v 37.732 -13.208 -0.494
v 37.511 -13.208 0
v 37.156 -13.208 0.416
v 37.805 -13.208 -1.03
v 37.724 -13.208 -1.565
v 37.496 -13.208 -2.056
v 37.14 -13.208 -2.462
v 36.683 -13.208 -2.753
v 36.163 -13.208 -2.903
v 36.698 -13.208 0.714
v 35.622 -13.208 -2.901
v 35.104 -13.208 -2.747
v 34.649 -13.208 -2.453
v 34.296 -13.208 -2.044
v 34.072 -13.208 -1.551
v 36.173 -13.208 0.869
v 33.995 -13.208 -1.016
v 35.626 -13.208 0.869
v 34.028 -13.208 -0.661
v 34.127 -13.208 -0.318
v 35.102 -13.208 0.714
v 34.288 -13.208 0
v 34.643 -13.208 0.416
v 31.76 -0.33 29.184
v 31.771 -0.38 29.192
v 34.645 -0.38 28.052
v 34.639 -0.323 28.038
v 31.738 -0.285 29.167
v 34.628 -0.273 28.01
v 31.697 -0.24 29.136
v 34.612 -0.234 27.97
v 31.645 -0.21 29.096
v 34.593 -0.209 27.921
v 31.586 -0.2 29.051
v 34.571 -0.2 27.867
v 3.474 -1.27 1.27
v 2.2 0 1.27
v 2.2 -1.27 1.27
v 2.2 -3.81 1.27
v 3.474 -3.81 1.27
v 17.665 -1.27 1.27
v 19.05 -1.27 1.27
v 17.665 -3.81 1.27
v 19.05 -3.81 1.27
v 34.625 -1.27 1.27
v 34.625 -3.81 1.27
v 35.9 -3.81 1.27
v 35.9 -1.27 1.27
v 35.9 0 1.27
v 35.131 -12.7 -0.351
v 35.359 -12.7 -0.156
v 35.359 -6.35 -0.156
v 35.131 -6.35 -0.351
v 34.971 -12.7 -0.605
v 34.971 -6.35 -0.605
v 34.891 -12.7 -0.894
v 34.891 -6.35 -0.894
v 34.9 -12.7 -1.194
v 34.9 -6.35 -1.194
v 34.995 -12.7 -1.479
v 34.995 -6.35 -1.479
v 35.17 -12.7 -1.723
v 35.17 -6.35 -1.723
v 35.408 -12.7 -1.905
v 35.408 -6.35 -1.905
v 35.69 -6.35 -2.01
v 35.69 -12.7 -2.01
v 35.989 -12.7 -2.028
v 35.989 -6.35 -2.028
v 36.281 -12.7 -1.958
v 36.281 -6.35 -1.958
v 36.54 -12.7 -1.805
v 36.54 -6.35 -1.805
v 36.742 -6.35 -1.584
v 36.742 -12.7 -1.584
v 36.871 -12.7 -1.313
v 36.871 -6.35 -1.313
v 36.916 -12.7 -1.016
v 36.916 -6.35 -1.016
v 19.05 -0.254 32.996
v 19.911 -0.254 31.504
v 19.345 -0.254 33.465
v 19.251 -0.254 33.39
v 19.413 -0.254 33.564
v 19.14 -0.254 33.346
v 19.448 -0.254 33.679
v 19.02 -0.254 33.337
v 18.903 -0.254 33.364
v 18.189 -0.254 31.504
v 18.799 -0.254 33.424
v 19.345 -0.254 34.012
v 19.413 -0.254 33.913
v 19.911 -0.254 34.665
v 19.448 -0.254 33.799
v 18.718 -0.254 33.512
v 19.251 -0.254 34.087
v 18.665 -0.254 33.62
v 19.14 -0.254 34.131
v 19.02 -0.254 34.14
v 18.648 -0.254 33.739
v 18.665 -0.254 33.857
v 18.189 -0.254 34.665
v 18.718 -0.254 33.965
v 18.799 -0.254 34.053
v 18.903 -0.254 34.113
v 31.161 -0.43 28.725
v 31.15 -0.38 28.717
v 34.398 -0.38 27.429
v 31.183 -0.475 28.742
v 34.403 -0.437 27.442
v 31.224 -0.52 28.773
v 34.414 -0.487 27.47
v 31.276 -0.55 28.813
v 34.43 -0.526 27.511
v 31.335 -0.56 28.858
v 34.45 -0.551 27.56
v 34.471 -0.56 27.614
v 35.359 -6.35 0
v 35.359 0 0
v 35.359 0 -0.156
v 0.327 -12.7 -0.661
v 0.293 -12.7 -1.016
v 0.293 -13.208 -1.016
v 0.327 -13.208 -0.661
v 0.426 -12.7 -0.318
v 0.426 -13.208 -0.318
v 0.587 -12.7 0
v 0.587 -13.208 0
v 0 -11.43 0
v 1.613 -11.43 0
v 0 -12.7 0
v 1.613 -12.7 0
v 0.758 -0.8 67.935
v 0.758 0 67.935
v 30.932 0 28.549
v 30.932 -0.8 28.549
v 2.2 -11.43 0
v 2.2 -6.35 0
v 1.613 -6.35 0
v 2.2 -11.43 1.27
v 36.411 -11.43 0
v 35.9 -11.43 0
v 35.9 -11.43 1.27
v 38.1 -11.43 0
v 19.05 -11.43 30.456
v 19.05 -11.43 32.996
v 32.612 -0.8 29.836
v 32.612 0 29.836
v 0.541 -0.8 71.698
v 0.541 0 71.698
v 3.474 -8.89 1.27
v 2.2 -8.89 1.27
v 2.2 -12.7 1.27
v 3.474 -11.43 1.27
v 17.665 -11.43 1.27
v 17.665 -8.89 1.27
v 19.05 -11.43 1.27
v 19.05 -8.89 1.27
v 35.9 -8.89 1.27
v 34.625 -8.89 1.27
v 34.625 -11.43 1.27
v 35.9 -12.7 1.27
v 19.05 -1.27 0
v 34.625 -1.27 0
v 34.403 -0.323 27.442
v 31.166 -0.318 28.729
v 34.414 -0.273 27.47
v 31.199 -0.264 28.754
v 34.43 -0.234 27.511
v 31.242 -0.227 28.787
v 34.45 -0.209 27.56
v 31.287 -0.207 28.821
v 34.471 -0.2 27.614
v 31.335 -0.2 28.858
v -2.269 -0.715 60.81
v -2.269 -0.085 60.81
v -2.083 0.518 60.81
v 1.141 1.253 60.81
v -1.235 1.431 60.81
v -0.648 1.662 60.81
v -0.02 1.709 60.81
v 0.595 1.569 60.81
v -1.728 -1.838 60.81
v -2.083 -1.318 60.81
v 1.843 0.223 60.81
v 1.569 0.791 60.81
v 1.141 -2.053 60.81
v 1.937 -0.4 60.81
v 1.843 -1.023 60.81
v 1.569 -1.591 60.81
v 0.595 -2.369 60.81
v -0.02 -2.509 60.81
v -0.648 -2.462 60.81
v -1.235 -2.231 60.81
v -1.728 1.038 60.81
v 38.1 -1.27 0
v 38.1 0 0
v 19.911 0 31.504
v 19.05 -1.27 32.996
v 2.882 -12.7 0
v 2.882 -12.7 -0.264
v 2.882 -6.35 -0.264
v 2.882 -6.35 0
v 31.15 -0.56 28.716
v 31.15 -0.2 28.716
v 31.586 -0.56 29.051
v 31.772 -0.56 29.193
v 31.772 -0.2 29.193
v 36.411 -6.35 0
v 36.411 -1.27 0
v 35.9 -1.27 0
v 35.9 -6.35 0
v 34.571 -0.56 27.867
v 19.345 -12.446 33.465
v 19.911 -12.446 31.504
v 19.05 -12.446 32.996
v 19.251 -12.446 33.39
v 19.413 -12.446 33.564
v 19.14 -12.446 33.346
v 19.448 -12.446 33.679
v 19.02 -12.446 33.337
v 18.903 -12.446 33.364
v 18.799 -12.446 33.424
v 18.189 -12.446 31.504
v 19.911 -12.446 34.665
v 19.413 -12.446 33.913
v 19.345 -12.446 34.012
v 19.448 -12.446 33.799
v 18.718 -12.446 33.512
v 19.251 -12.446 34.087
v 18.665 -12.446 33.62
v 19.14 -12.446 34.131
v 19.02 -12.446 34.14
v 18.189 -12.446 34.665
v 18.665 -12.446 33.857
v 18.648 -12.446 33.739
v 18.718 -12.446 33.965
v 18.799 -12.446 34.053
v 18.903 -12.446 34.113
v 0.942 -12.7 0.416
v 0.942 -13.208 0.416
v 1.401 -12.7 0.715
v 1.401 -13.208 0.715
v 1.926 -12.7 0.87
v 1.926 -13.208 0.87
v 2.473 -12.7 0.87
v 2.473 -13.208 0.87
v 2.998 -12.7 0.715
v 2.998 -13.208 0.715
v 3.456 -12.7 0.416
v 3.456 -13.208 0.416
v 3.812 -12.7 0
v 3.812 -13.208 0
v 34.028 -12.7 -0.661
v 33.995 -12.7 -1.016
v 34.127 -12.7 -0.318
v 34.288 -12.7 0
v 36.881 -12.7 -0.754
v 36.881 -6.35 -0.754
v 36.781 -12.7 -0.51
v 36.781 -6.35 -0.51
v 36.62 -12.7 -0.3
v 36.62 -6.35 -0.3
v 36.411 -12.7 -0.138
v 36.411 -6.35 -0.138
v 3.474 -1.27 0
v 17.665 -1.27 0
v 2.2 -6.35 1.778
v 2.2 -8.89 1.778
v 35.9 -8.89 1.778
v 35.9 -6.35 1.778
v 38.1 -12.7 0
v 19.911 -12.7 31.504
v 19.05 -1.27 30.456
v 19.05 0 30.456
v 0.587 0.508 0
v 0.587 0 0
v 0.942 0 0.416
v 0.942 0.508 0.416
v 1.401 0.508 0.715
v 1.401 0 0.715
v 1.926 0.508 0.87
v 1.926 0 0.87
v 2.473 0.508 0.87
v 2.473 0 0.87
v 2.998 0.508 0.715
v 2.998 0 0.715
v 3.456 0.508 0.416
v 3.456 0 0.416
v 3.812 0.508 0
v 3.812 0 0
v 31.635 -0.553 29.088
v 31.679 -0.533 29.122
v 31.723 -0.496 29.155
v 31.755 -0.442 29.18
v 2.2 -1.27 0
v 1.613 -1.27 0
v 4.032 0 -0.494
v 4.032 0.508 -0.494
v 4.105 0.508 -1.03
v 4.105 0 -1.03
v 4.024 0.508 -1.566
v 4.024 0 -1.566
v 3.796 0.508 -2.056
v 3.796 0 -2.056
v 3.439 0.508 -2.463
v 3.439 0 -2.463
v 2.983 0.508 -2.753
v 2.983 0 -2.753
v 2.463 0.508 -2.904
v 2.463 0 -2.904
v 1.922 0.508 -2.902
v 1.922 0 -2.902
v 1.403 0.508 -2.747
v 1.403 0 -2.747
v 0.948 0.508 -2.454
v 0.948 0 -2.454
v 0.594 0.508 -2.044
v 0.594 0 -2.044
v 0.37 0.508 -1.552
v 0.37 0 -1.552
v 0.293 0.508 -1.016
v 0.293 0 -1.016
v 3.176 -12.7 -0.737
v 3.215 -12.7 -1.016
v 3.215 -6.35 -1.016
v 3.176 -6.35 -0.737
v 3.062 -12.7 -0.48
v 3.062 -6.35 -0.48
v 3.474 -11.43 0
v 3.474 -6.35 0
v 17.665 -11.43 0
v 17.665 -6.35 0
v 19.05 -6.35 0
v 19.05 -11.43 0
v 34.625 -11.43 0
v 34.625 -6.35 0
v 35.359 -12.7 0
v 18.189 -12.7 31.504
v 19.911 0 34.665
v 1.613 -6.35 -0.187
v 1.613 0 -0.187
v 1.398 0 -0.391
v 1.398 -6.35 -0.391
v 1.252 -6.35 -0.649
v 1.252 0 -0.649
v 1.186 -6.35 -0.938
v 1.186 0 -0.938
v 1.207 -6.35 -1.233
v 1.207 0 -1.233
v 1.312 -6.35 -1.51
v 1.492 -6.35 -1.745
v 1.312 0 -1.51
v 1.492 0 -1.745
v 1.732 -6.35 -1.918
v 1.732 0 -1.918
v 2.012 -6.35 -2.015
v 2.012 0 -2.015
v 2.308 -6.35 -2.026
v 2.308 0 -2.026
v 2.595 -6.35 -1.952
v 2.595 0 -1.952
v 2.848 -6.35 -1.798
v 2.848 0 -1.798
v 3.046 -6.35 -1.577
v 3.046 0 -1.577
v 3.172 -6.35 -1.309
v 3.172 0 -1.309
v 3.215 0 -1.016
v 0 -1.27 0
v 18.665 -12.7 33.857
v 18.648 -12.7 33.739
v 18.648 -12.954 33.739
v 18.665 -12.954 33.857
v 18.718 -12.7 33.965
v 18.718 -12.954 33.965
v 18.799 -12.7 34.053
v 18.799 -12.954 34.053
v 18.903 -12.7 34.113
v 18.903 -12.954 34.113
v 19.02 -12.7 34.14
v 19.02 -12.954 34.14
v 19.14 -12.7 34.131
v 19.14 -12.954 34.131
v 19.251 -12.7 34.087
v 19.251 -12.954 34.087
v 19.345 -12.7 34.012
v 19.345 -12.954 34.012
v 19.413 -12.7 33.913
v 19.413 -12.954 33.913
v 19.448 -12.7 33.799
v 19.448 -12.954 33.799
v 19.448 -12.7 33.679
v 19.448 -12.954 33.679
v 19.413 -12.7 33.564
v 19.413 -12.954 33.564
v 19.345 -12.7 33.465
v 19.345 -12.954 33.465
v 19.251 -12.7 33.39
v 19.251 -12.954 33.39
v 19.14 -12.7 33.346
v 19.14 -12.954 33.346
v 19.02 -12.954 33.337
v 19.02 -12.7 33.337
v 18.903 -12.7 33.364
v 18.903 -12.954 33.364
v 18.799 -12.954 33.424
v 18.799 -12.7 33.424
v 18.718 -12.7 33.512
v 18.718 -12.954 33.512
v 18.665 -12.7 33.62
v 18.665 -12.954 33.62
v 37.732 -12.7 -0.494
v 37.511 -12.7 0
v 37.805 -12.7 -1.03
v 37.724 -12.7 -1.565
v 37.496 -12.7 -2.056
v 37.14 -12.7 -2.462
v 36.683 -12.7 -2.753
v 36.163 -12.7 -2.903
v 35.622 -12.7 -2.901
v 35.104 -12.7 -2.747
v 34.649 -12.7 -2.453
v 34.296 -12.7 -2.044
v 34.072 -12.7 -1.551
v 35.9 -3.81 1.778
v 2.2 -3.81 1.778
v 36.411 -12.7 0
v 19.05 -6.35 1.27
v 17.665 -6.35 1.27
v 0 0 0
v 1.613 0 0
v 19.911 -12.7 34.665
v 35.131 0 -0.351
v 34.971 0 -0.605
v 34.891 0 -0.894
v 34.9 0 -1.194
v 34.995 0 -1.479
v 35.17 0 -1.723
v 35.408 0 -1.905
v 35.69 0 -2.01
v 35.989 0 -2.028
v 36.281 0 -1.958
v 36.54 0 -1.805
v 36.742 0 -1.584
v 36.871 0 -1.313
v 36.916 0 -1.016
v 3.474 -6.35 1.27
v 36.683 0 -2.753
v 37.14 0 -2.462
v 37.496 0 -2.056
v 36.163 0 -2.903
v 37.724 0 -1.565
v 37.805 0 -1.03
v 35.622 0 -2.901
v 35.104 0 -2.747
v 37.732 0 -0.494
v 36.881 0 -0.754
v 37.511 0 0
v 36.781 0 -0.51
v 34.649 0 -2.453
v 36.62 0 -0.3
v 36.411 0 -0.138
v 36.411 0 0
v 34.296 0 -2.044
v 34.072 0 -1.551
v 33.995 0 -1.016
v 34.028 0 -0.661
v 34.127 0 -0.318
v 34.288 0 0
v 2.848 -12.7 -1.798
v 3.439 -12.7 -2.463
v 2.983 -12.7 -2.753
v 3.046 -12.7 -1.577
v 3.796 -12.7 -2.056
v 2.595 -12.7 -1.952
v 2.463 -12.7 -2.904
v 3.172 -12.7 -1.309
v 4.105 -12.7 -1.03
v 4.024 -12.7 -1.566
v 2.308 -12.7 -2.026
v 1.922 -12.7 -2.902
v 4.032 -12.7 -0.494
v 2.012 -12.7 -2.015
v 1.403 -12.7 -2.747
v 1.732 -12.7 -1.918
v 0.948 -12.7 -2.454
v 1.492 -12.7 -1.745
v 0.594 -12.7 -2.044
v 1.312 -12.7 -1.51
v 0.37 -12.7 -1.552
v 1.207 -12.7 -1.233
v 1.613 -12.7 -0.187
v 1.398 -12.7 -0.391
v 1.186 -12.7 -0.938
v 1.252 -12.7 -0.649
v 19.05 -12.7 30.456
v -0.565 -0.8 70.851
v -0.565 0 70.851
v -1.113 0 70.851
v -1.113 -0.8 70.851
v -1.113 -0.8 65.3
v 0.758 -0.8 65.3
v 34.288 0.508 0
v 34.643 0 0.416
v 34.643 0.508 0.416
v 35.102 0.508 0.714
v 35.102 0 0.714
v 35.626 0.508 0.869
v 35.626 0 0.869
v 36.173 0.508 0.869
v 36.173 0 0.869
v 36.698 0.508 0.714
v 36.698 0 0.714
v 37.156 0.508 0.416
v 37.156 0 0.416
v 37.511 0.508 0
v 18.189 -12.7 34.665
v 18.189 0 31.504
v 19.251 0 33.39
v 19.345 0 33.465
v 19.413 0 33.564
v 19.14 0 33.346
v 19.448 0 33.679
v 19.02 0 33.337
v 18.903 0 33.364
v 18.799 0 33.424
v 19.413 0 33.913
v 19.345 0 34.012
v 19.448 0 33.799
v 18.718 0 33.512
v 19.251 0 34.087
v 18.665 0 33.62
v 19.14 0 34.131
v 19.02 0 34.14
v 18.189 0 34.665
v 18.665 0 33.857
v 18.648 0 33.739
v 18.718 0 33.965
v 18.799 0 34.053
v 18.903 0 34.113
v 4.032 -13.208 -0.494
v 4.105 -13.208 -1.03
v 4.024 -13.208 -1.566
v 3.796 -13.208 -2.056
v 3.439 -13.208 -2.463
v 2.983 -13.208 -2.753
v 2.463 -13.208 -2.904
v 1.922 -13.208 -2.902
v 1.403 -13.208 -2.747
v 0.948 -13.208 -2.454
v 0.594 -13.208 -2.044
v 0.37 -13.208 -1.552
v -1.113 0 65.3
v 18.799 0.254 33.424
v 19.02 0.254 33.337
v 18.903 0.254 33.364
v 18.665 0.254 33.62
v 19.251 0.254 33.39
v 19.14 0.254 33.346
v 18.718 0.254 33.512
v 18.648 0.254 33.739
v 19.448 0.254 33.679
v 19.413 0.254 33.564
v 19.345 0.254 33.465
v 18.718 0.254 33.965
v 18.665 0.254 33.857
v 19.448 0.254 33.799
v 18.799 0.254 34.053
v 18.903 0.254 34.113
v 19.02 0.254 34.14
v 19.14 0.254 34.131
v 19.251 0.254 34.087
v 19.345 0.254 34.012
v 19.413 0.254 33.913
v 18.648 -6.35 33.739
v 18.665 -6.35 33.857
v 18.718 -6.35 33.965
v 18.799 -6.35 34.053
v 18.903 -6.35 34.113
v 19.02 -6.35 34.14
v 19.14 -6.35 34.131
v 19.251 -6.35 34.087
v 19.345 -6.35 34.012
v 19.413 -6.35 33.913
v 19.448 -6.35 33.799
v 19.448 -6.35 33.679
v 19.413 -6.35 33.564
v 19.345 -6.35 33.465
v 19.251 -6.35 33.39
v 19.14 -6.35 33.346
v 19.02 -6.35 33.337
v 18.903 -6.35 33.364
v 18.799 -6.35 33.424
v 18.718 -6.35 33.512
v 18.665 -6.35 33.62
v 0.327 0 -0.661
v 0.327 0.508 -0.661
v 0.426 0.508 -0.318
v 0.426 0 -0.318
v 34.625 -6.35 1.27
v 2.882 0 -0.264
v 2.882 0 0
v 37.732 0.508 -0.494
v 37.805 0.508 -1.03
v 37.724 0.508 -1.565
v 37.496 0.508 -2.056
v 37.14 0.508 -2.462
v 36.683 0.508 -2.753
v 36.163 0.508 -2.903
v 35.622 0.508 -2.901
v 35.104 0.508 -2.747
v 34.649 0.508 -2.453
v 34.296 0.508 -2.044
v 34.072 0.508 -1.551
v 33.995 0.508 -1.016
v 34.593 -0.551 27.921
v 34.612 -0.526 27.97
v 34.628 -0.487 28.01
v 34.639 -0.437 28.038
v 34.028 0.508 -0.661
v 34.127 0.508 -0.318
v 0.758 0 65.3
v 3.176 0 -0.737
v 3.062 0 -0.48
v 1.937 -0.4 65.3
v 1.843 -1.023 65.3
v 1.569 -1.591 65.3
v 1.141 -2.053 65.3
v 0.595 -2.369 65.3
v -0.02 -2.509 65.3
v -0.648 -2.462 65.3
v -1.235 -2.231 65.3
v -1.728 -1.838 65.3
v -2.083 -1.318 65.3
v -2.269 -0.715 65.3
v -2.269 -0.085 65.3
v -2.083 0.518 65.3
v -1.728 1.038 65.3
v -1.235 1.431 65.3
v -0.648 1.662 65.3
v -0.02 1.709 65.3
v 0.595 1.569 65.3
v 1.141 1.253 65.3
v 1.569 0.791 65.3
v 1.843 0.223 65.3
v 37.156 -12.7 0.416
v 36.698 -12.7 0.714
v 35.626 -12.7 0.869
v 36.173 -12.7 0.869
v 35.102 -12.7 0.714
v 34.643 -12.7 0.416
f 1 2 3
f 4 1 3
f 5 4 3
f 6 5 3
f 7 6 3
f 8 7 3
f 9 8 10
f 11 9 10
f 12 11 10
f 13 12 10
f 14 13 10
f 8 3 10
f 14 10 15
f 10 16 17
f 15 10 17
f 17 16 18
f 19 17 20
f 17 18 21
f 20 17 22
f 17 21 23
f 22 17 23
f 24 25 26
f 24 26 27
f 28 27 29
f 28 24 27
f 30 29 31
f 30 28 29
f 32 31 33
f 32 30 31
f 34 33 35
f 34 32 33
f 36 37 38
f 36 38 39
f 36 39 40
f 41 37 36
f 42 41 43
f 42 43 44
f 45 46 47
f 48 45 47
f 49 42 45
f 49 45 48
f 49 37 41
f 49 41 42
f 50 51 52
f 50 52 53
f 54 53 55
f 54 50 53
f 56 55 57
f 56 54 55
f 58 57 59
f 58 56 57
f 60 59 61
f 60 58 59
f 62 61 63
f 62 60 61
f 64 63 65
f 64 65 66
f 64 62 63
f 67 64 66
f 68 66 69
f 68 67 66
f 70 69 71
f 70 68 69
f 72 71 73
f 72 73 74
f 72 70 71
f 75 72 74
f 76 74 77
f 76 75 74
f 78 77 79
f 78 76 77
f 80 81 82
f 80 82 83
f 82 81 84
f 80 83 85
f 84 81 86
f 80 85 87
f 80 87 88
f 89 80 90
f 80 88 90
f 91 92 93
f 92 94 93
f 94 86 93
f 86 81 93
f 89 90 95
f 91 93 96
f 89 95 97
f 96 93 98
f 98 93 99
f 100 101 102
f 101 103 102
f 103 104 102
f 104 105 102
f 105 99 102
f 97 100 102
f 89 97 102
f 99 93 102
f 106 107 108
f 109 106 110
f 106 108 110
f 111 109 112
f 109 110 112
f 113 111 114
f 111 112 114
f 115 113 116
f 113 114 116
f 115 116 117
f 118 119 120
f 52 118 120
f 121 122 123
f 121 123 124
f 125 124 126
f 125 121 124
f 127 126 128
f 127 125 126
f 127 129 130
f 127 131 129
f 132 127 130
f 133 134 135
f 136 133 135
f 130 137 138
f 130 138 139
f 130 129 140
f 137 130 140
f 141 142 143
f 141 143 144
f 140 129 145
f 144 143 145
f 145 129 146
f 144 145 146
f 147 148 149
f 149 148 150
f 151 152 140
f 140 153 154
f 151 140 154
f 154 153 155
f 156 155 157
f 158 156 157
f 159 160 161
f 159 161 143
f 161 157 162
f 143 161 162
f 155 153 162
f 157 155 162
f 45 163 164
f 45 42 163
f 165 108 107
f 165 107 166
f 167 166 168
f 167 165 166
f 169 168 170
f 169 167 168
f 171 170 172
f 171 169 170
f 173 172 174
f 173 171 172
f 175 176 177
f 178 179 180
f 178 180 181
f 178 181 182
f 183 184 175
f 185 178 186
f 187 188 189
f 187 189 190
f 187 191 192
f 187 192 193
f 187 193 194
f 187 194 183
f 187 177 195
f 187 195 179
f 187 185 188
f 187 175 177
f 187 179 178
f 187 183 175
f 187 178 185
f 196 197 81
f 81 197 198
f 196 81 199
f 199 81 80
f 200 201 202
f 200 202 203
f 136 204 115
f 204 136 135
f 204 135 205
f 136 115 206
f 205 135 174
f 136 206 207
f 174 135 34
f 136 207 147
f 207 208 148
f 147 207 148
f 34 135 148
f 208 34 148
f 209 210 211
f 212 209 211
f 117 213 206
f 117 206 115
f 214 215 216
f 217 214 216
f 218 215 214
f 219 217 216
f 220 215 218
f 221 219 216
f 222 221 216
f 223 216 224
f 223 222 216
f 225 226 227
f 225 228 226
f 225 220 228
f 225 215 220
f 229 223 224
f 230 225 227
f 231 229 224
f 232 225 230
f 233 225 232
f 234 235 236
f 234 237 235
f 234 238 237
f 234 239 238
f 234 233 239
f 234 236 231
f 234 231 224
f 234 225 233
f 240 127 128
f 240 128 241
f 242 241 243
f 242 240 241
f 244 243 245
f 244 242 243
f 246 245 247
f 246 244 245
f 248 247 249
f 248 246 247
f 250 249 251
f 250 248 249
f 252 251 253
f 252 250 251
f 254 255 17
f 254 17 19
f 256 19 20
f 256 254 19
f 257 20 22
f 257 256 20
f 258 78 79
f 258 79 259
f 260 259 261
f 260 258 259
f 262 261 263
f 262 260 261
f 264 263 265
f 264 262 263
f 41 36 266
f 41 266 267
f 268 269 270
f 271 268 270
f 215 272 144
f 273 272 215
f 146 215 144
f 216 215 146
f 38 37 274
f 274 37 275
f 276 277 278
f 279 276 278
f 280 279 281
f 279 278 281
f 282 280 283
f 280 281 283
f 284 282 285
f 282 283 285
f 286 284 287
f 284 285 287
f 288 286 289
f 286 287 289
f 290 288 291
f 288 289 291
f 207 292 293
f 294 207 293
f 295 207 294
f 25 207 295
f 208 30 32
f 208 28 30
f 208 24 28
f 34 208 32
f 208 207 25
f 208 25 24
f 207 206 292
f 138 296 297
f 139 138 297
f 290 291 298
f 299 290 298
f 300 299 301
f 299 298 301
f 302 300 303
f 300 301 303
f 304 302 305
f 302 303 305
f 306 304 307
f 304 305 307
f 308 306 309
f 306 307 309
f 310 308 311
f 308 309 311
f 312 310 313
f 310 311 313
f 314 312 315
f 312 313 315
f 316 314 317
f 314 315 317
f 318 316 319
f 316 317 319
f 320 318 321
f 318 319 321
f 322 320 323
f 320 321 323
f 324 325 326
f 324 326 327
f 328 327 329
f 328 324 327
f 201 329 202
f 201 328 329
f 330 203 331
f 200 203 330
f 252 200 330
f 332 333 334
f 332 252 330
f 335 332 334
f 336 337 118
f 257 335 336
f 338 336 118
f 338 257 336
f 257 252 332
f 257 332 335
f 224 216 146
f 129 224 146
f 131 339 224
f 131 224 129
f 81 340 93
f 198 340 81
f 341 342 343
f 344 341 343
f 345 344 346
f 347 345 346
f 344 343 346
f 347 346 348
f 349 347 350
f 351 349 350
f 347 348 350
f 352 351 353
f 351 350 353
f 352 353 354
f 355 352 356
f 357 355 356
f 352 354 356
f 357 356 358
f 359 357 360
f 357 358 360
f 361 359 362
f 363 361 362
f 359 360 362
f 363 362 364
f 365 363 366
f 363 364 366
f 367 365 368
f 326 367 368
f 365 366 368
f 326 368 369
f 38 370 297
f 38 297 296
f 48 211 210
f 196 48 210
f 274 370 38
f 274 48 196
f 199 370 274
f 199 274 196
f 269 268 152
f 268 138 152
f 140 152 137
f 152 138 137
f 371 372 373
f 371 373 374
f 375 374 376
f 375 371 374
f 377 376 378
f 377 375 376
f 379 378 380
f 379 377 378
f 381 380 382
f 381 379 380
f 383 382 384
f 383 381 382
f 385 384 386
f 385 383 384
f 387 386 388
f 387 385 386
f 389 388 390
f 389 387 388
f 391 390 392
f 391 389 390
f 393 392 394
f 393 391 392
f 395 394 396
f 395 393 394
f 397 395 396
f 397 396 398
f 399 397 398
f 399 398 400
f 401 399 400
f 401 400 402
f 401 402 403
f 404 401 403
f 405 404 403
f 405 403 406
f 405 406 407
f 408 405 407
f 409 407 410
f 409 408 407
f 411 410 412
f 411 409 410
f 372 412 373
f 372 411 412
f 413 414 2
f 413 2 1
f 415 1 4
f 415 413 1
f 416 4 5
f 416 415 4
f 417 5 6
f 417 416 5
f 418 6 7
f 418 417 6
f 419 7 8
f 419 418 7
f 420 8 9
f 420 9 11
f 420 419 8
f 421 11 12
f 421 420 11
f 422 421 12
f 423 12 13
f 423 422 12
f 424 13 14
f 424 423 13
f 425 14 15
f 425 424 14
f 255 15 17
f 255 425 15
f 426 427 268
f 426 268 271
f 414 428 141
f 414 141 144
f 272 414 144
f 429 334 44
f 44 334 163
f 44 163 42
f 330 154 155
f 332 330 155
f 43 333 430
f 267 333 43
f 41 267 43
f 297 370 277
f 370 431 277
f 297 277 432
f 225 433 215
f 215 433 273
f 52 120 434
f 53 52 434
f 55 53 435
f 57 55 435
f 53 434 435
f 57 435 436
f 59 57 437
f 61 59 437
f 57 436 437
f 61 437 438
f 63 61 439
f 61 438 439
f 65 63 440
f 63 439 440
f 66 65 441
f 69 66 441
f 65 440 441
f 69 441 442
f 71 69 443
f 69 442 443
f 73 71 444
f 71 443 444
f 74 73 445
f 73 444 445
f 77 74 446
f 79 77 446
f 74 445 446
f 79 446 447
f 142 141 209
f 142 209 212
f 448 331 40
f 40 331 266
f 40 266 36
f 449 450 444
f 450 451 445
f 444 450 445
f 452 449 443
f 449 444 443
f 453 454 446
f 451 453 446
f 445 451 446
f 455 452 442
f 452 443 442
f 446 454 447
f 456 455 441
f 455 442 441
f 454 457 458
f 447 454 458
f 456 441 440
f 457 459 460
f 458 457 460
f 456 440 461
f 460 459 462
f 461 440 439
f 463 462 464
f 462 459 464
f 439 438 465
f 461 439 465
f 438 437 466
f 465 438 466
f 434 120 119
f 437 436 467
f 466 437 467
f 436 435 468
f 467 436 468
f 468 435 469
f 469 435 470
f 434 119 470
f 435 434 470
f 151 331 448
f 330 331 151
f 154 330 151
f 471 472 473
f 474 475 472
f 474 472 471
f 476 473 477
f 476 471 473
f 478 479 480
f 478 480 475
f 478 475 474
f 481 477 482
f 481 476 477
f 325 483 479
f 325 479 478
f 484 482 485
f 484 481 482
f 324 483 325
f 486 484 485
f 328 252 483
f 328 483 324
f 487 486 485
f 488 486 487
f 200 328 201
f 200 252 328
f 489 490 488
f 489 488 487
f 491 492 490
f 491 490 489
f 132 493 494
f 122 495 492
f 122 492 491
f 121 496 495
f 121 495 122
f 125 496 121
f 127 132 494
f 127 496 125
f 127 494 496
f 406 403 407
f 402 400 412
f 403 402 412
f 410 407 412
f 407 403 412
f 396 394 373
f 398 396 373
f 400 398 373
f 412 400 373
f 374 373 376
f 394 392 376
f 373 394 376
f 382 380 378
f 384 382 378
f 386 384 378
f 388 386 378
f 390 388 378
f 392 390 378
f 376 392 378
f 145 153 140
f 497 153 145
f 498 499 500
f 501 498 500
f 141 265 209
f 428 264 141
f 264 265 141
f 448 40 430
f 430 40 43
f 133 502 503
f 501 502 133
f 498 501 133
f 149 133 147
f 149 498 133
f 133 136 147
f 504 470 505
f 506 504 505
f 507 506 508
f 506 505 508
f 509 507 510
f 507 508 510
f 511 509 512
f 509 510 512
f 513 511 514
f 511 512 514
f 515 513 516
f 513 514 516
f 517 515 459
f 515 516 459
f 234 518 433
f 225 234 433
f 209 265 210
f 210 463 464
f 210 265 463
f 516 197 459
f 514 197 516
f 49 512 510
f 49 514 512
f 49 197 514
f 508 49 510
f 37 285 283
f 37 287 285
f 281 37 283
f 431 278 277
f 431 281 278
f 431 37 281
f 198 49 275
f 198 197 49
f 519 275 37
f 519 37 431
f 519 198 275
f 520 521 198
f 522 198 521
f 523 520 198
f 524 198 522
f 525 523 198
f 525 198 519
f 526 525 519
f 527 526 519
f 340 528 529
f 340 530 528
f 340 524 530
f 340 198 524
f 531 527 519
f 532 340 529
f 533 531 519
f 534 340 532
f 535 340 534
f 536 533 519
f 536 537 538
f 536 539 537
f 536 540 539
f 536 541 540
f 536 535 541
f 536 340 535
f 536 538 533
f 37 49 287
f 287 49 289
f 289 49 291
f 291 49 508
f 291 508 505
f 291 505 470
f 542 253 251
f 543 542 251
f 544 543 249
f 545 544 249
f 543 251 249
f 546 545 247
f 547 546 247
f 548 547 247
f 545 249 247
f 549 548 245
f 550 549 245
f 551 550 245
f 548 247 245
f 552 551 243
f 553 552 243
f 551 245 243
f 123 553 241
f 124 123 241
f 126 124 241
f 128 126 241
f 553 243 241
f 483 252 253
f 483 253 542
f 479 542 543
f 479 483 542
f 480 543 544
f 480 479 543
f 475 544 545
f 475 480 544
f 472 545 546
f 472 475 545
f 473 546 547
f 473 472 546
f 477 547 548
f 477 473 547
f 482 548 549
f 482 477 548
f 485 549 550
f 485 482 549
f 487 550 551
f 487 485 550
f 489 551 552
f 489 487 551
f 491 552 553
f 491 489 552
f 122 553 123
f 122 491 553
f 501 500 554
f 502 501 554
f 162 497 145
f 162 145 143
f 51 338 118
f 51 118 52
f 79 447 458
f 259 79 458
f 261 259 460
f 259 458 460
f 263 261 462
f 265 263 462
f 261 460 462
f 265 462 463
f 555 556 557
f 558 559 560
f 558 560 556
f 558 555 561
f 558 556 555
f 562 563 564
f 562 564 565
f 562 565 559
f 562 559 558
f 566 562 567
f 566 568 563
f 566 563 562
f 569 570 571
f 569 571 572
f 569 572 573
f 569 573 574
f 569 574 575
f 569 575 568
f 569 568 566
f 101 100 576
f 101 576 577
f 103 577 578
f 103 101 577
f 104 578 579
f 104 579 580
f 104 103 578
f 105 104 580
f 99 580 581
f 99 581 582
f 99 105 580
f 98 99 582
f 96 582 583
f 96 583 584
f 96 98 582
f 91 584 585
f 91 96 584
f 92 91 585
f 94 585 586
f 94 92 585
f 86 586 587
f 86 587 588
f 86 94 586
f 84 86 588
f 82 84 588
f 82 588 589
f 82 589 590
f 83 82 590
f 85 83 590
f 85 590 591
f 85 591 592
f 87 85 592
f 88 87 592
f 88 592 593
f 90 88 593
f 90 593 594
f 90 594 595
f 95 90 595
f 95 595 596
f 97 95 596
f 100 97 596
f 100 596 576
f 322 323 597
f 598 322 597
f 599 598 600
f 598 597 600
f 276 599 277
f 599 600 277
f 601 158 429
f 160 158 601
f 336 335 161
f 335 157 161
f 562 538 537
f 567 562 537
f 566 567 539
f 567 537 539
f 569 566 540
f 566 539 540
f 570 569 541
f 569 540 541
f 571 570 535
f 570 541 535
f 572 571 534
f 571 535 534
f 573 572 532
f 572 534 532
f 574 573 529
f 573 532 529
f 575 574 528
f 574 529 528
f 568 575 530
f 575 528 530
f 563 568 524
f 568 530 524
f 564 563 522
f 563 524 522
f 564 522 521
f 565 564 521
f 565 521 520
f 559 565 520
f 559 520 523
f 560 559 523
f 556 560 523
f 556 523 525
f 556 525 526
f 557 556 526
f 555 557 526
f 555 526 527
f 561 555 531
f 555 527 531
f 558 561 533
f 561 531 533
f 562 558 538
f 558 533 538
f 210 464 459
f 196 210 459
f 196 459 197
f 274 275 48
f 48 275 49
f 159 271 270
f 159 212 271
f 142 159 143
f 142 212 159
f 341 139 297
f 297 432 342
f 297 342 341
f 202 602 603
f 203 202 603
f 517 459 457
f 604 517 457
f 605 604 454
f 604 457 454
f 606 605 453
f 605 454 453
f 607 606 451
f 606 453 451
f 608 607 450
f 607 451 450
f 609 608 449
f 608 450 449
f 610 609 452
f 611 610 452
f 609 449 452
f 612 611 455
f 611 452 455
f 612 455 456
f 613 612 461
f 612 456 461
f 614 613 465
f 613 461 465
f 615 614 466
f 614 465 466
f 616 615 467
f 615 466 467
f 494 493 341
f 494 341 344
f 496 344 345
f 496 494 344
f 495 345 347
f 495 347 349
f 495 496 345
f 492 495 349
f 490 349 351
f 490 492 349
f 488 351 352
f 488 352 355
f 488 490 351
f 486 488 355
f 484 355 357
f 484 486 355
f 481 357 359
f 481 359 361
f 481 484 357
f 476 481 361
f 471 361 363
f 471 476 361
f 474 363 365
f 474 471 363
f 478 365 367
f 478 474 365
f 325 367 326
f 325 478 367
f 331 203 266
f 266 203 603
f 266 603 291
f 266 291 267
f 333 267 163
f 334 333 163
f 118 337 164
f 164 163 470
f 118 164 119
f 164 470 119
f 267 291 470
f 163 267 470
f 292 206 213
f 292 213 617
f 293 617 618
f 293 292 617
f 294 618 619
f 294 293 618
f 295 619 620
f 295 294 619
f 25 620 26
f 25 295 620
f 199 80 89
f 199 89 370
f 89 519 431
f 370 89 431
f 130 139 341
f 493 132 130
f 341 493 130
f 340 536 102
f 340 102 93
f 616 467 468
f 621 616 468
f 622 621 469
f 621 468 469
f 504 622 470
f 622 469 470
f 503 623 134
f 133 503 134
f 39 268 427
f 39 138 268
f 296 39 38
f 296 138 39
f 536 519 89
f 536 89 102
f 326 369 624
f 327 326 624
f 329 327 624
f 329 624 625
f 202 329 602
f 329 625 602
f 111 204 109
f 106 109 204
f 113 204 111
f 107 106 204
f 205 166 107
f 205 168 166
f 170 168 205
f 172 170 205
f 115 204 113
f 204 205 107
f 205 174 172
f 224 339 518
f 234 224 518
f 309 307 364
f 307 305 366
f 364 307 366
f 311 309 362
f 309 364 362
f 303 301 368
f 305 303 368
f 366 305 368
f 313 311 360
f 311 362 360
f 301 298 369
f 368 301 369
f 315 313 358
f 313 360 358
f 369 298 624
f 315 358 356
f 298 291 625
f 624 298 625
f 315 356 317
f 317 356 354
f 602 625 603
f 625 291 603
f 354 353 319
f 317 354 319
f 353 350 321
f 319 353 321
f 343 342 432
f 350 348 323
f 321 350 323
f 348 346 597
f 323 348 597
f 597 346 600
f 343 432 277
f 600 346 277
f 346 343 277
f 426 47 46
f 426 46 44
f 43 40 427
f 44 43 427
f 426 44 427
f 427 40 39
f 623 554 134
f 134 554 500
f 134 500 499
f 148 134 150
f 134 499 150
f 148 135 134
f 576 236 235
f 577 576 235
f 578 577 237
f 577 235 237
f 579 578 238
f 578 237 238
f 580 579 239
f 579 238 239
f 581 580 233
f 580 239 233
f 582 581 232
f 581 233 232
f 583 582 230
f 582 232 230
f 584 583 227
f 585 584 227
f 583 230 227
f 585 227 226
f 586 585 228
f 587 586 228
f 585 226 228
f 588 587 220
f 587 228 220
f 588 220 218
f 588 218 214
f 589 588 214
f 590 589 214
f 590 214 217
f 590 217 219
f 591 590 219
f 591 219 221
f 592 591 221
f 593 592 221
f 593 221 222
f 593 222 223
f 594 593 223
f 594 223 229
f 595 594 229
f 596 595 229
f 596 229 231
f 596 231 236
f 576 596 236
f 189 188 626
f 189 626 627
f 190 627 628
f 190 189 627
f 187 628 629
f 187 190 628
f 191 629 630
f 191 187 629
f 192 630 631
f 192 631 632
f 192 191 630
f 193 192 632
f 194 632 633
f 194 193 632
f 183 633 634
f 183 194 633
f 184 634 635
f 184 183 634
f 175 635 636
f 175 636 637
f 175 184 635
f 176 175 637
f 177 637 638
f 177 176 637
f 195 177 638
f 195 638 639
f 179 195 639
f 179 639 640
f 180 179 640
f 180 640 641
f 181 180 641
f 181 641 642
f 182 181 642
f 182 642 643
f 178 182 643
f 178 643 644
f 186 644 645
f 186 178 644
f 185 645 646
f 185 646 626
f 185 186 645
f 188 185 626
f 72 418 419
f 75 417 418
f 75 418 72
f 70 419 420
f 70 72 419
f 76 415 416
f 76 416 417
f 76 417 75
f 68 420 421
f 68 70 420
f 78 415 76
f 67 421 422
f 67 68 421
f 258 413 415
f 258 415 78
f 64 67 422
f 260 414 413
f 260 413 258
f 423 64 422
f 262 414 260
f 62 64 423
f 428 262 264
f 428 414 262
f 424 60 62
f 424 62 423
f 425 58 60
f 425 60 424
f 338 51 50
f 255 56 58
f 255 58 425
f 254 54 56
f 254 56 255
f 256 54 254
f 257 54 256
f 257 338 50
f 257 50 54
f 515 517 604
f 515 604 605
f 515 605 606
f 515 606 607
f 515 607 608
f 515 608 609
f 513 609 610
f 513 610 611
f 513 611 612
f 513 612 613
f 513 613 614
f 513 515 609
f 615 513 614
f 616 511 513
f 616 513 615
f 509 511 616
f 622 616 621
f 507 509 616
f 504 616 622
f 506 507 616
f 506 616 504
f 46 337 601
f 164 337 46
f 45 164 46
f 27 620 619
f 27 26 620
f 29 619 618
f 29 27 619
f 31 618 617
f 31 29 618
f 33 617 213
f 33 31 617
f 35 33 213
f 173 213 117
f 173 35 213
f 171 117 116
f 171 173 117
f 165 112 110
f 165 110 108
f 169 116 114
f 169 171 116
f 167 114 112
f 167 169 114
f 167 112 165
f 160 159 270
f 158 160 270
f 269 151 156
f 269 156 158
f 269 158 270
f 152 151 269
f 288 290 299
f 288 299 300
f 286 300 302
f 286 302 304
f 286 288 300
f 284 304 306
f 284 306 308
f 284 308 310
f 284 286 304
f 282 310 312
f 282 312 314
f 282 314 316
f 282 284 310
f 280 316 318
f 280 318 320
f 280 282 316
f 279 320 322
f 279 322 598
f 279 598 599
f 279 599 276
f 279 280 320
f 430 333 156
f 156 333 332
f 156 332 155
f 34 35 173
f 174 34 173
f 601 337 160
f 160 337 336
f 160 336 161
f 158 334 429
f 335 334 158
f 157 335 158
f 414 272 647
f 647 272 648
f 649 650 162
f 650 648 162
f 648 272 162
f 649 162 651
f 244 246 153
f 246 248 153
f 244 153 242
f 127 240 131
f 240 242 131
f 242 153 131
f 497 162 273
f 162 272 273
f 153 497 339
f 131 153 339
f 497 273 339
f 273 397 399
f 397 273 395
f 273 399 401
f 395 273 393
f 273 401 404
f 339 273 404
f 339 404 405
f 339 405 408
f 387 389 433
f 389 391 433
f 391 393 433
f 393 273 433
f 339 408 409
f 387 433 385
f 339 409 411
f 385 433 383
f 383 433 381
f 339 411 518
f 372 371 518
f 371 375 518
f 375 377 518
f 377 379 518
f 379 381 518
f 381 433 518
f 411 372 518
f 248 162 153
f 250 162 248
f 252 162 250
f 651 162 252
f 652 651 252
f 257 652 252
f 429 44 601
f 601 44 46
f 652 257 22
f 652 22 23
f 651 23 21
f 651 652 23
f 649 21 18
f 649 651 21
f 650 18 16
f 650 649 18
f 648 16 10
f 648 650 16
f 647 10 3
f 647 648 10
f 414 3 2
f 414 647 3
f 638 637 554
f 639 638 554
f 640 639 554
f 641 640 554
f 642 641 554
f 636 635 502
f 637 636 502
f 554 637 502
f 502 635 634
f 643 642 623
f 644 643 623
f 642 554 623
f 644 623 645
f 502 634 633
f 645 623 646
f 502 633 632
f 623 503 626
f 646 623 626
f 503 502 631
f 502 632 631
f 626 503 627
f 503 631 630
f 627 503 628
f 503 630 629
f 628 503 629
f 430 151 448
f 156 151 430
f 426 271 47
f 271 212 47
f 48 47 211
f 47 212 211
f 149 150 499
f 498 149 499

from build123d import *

# Parameters (mm, degrees)
F1_DEPTH       = 1.27
F2_W           = 1.2741235553
F2_H           = 1.2699995968
F2_W_2         = 1.3848708451
F2_W_3         = 1.2754402073
F3_DEPTH       = 5.08
F4_DEPTH       = 6.35
F6_DEPTH       = 0.508
F7_W           = 14.1913017724
F7_H           = 2.54
F7_W_2         = 1.2741235553
F7_W_3         = 1.3848708451
F7_W_4         = 15.5748559654
F7_W_5         = 1.2754402073
F8_DEPTH       = 0.508
F9_R           = 0.4024133142
F10_DEPTH      = 0.254
F11_DEPTH      = 0.254
F11_DEPTH_BACK = 6.35
F13_W          = 1.8706470204
F13_H          = 7.1249634751
F14_DEPTH      = 0.8
F15_R          = 2.114680679
F16_DEPTH      = 4.49
F18_START      = -0.2
F18_DEPTH      = 0.36
F19_T4_DEPTH   = 4.0914390002
F19_T9_DEPTH   = 4.0914390002
F19_T14_DEPTH  = 4.4938721404
F19_T19_DEPTH  = 4.4938721404


# Not quite as in the source:
# - a fillet or chamfer that OpenCascade refuses, or shapes differently, is made with other operations: its cross-section is extruded or revolved along the edge and cut away or added


with BuildPart() as f1:
    # F0 (on Front) → F1 (new body)
    with BuildSketch(Plane.XZ):
        Polygon((19.05, 32.9955678842), (0, 0), (1.6125002281, 0), (2.1992265269, 0), (2.8824598566, 0), (35.3591272308, 0), (35.8998188724, 0), (36.4111034397, 0), (38.1, 0), align=None)
        Polygon((35.9002961727, 1.2699995968), (2.1997038273, 1.2699995968), (19.05, 30.4555686905), align=None, mode=Mode.SUBTRACT)
    extrude(amount=F1_DEPTH)

    # F2 (on face) → F3 (join)
    with BuildSketch(Plane.XZ.offset(1.27)):
        with Locations((2.8367656049, 0.6349997984)):
            Rectangle(F2_W, F2_H)
        with Locations((18.3575645775, 0.6349997984)):
            Rectangle(F2_W_2, F2_H)
        with Locations((35.262576069, 0.6349997984)):
            Rectangle(F2_W_3, F2_H)
    extrude(amount=F3_DEPTH)

    # F0 (on Front) → F4 (join)
    with BuildSketch(Plane.XZ):
        with BuildLine():
            ThreePointArc((2.8824598566, -0.264036949), (2.5654652787, -0.0683053067), (2.1992265269, 0))
            ThreePointArc((2.1992265269, 0), (1.8913938178, -0.0477567136), (1.6125002281, -0.186537282))
            ThreePointArc((1.6125002281, -0.186537282), (1.7322454443, -1.9183226781), (3.2152269301, -1.0160004032))
            ThreePointArc((3.2152269301, -1.0160004032), (3.1283180611, -0.6048486789), (2.8824598566, -0.264036949))
        make_face()
        with BuildLine():
            ThreePointArc((36.4111034397, -0.138022664), (36.1646122657, -0.0351123983), (35.8998188724, 0))
            ThreePointArc((35.8998188724, 0), (35.6184705575, -0.0397320257), (35.3591272308, -0.1558205569))
            ThreePointArc((35.3591272308, -0.1558205569), (35.4084361837, -1.9052696945), (36.9158192755, -1.0160004032))
            ThreePointArc((36.9158192755, -1.0160004032), (36.7806486362, -0.5096450474), (36.4111034397, -0.138022664))
        make_face()
        with BuildLine():
            Line((2.1992265269, 0), (1.6125002281, 0))
            Line((1.6125002281, 0), (1.6125002281, -0.186537282))
            ThreePointArc((1.6125002281, -0.186537282), (1.8913938178, -0.0477567136), (2.1992265269, 0))
        make_face()
        with BuildLine():
            Line((36.4111034397, -0.138022664), (36.4111034397, 0))
            Line((36.4111034397, 0), (35.8998188724, 0))
            ThreePointArc((35.8998188724, 0), (36.1646122657, -0.0351123983), (36.4111034397, -0.138022664))
        make_face()
        with BuildLine():
            Line((35.8998188724, 0), (35.3591272308, 0))
            Line((35.3591272308, 0), (35.3591272308, -0.1558205569))
            ThreePointArc((35.3591272308, -0.1558205569), (35.6184705575, -0.0397320257), (35.8998188724, 0))
        make_face()
        with BuildLine():
            Line((2.8824598566, 0), (2.1992265269, 0))
            ThreePointArc((2.1992265269, 0), (2.5654652787, -0.0683053067), (2.8824598566, -0.264036949))
            Line((2.8824598566, -0.264036949), (2.8824598566, 0))
        make_face()
    extrude(amount=F4_DEPTH)

    # F5 (on face) → F6 (join)
    with BuildSketch(Plane(origin=(0, 0, 0), x_dir=(-1, 0, 0), z_dir=(0, 1, 0))):
        with BuildLine():
            Line((-35.3591272308, 0), (-34.2883697789, 0))
            ThreePointArc((-34.2883697789, 0), (-35.8998188724, 0.8889995968), (-37.5112679658, 0))
            Line((-37.5112679658, 0), (-36.4111034397, 0))
            Line((-36.4111034397, 0), (-36.4111034397, -0.138022664))
            ThreePointArc((-36.4111034397, -0.138022664), (-35.9170056479, -2.0318554293), (-35.3591272308, -0.1558205569))
            Line((-35.3591272308, -0.1558205569), (-35.3591272308, 0))
        make_face()
        with BuildLine():
            ThreePointArc((-37.5112679658, 0), (-36.4285978796, -2.8461418626), (-33.9948188724, -1.0160004032))
            ThreePointArc((-33.9948188724, -1.0160004032), (-34.0696774129, -0.4872213959), (-34.2883697789, 0))
            Line((-34.2883697789, 0), (-35.3591272308, 0))
            Line((-35.3591272308, 0), (-35.3591272308, -0.1558205569))
            ThreePointArc((-35.3591272308, -0.1558205569), (-35.9170056479, -2.0318554293), (-36.4111034397, -0.138022664))
            Line((-36.4111034397, -0.138022664), (-36.4111034397, 0))
            Line((-36.4111034397, 0), (-37.5112679658, 0))
        make_face()
        with BuildLine():
            Line((-2.8824598566, 0), (-3.8117017372, 0))
            ThreePointArc((-3.8117017372, 0), (-2.7279836056, -2.8470517609), (-0.293358451, -1.0160004032))
            ThreePointArc((-0.293358451, -1.0160004032), (-0.3681751692, -0.4872433245), (-0.5867513167, 0))
            Line((-0.5867513167, 0), (-1.6125002281, 0))
            Line((-1.6125002281, 0), (-1.6125002281, -0.186537282))
            ThreePointArc((-1.6125002281, -0.186537282), (-2.1373399263, -2.030114237), (-2.8824598566, -0.264036949))
            Line((-2.8824598566, -0.264036949), (-2.8824598566, 0))
        make_face()
        with BuildLine():
            ThreePointArc((-0.5867513167, 0), (-2.1992265269, 0.8898676727), (-3.8117017372, 0))
            Line((-3.8117017372, 0), (-2.8824598566, 0))
            Line((-2.8824598566, 0), (-2.8824598566, -0.264036949))
            ThreePointArc((-2.8824598566, -0.264036949), (-2.1373399263, -2.030114237), (-1.6125002281, -0.186537282))
            Line((-1.6125002281, -0.186537282), (-1.6125002281, 0))
            Line((-1.6125002281, 0), (-0.5867513167, 0))
        make_face()
    extrude(amount=F6_DEPTH)

    # F7 (on face) → F8 (join)
    with BuildSketch(Plane.XY.offset(1.2699995968)):
        with Locations((10.5694782687, -5.08)):
            Rectangle(F7_W, F7_H)
        with Locations((2.8367656049, -5.08)):
            Rectangle(F7_W_2, F7_H)
        with Locations((18.3575645775, -5.08)):
            Rectangle(F7_W_3, F7_H)
        with Locations((26.8374279827, -5.08)):
            Rectangle(F7_W_4, F7_H)
        with Locations((35.262576069, -5.08)):
            Rectangle(F7_W_5, F7_H)
    extrude(amount=F8_DEPTH)

    # F9 (on face) → F10 (join)
    with BuildSketch(Plane(origin=(0, 0, 0), x_dir=(-1, 0, 0), z_dir=(0, 1, 0))):
        Polygon((-19.9114145483, 34.6649885178), (-19.9114145483, 31.5035541202), (-19.05, 32.9955678842), (-18.1885854517, 31.5035541202), (-18.1885854517, 34.6649885178), align=None)
        with Locations((-19.05, 33.7386541069)):
            Circle(F9_R, mode=Mode.SUBTRACT)
        Polygon((-19.05, 32.9955678842), (-19.9114145483, 31.5035541202), (-18.1885854517, 31.5035541202), align=None)
    extrude(amount=-F10_DEPTH)

    # F9 (on face) → F11 (join, two sides)
    with BuildSketch(Plane(origin=(0, 0, 0), x_dir=(-1, 0, 0), z_dir=(0, 1, 0))) as f11_sk:
        with Locations((-19.05, 33.7386541069)):
            Circle(F9_R)
    extrude(amount=F11_DEPTH)
    extrude(f11_sk.sketch, amount=-F11_DEPTH_BACK)

    # F12: F1 across face


with BuildPart() as f1_1:
    add(f1.part)
    add(f1.part.mirror(Plane(origin=(18.9844198468, -6.35, 0.7885271629), x_dir=(1, 0, 0), z_dir=(0, -1, 0))))


with BuildPart() as f14:
    # F13 (on Front) → F14 (new body)
    with BuildSketch(Plane.XZ):
        Polygon((32.6115151858, 29.8361999529), (1.6799610114, 70.211231729), (0, 68.9242035151), (0.7575490221, 67.9353729614), (30.9315541743, 28.5491717389), align=None)
        Polygon((0, 68.9242035151), (1.6799610114, 70.211231729), (0.5408330401, 71.6981381993), (-0.5648436262, 70.851072669), (-1.1130979983, 70.4310517039), (-1.1130979983, 70.3771329992), align=None)
        Polygon((0.7575490221, 67.9353729614), (0, 68.9242035151), (-1.1130979983, 70.3771329992), (-1.1130979983, 67.9353729614), align=None)
        with Locations((-0.1777744881, 64.3728912239)):
            Rectangle(F13_W, F13_H)
        Polygon((-1.1130979983, 70.4310517039), (-0.5648436262, 70.851072669), (-1.1130979983, 70.851072669), align=None)
    extrude(amount=F14_DEPTH)

    # F15 (on face) → F16 (join)
    with BuildSketch(Plane(origin=(0, 0, 60.8104094863), x_dir=(1, 0, 0), z_dir=(0, 0, -1))):
        with Locations((-0.1777744881, 0.4)):
            Circle(F15_R)
        Polygon((0.7575490221, 0), (-0.1777744881, 0), (-1.1130979983, 0), (-1.1130979983, 0.8), (-0.1777744881, 0.8), (0.7575490221, 0.8), align=None, mode=Mode.SUBTRACT)
    extrude(amount=-F16_DEPTH)

    # F17 (on face) → F18 (join)
    with BuildSketch(Plane(origin=(0, 0, 0), x_dir=(-1, 0, 0), z_dir=(0, 1, 0)).offset(F18_START)):
        Polygon((-31.1495605422, 28.7161877258), (-31.77153468, 29.1926858459), (-34.645114094, 28.052713722), (-34.3972128675, 27.4278178617), align=None)
    extrude(amount=-F18_DEPTH)

    # F19: fillet of radius 0.2 on 4 edges, made by hand


with BuildPart() as f19_tool2:
    # F19_s3 → F19_t4 (new body)
    with BuildSketch(Plane(origin=(16.9803344824, 0, -6.7362356057), x_dir=(0, 1, 0), z_dir=(0.929528098, 0, -0.3687512915))):
        with BuildLine():
            ThreePointArc((-0.4, 38.8512161966), (-0.2585786438, 38.7926375529), (-0.2, 38.6512161966))
            Line((-0.2, 38.6512161966), (-0.2, 38.8512161966))
            Line((-0.2, 38.8512161966), (-0.4, 38.8512161966))
        make_face()
    extrude(amount=F19_T4_DEPTH)

    split(bisect_by=Plane(origin=(-2.3425232995, 0, 3.0577012755), x_dir=(0, 1, 0), z_dir=(0.6081511973, 0, -0.7938212149)), keep=Keep.TOP)


with BuildPart() as f14_1:
    add(f14.part)

    # F19_t1: cut F19_tool2
    add(f19_tool2.part, mode=Mode.SUBTRACT)


with BuildPart() as f19_tool7:
    # F19_s8 → F19_t9 (new body)
    with BuildSketch(Plane(origin=(16.9803344824, 0, -6.7362356057), x_dir=(0, 1, 0), z_dir=(0.929528098, 0, -0.3687512915))):
        with BuildLine():
            ThreePointArc((-0.56, 38.6512161966), (-0.5014213562, 38.7926375529), (-0.36, 38.8512161966))
            Line((-0.36, 38.8512161966), (-0.56, 38.8512161966))
            Line((-0.56, 38.8512161966), (-0.56, 38.6512161966))
        make_face()
    extrude(amount=F19_T9_DEPTH)

    split(bisect_by=Plane(origin=(-2.3425232995, 0, 3.0577012755), x_dir=(0, 1, 0), z_dir=(0.6081511973, 0, -0.7938212149)), keep=Keep.TOP)


with BuildPart() as f14_2:
    add(f14_1.part)

    # F19_t6: cut F19_tool7
    add(f19_tool7.part, mode=Mode.SUBTRACT)


with BuildPart() as f19_tool12:
    # F19_s13 → F19_t14 (new body)
    with BuildSketch(Plane(origin=(20.7834419944, 0, -8.244959021), x_dir=(0, 1, 0), z_dir=(-0.929528098, 0, 0.3687512915))):
        with BuildLine():
            ThreePointArc((-0.4, -38.1789440387), (-0.2585786438, -38.2375226825), (-0.2, -38.3789440387))
            Line((-0.2, -38.3789440387), (-0.2, -38.1789440387))
            Line((-0.2, -38.1789440387), (-0.4, -38.1789440387))
        make_face()
    extrude(amount=F19_T14_DEPTH)

    split(bisect_by=Plane(origin=(-2.3425232995, 0, 3.0577012755), x_dir=(0, 1, 0), z_dir=(0.6081511973, 0, -0.7938212149)), keep=Keep.TOP)


with BuildPart() as f14_3:
    add(f14_2.part)

    # F19_t11: cut F19_tool12
    add(f19_tool12.part, mode=Mode.SUBTRACT)


with BuildPart() as f19_tool17:
    # F19_s18 → F19_t19 (new body)
    with BuildSketch(Plane(origin=(20.7834419944, 0, -8.244959021), x_dir=(0, 1, 0), z_dir=(-0.929528098, 0, 0.3687512915))):
        with BuildLine():
            ThreePointArc((-0.36, -38.1789440387), (-0.5014213562, -38.2375226825), (-0.56, -38.3789440387))
            Line((-0.56, -38.3789440387), (-0.56, -38.1789440387))
            Line((-0.56, -38.1789440387), (-0.36, -38.1789440387))
        make_face()
    extrude(amount=F19_T19_DEPTH)

    split(bisect_by=Plane(origin=(-2.3425232995, 0, 3.0577012755), x_dir=(0, 1, 0), z_dir=(0.6081511973, 0, -0.7938212149)), keep=Keep.TOP)


with BuildPart() as f14_4:
    add(f14_3.part)

    # F19_t16: cut F19_tool17
    add(f19_tool17.part, mode=Mode.SUBTRACT)


solid = Compound([f1_1.part, f14_4.part])
